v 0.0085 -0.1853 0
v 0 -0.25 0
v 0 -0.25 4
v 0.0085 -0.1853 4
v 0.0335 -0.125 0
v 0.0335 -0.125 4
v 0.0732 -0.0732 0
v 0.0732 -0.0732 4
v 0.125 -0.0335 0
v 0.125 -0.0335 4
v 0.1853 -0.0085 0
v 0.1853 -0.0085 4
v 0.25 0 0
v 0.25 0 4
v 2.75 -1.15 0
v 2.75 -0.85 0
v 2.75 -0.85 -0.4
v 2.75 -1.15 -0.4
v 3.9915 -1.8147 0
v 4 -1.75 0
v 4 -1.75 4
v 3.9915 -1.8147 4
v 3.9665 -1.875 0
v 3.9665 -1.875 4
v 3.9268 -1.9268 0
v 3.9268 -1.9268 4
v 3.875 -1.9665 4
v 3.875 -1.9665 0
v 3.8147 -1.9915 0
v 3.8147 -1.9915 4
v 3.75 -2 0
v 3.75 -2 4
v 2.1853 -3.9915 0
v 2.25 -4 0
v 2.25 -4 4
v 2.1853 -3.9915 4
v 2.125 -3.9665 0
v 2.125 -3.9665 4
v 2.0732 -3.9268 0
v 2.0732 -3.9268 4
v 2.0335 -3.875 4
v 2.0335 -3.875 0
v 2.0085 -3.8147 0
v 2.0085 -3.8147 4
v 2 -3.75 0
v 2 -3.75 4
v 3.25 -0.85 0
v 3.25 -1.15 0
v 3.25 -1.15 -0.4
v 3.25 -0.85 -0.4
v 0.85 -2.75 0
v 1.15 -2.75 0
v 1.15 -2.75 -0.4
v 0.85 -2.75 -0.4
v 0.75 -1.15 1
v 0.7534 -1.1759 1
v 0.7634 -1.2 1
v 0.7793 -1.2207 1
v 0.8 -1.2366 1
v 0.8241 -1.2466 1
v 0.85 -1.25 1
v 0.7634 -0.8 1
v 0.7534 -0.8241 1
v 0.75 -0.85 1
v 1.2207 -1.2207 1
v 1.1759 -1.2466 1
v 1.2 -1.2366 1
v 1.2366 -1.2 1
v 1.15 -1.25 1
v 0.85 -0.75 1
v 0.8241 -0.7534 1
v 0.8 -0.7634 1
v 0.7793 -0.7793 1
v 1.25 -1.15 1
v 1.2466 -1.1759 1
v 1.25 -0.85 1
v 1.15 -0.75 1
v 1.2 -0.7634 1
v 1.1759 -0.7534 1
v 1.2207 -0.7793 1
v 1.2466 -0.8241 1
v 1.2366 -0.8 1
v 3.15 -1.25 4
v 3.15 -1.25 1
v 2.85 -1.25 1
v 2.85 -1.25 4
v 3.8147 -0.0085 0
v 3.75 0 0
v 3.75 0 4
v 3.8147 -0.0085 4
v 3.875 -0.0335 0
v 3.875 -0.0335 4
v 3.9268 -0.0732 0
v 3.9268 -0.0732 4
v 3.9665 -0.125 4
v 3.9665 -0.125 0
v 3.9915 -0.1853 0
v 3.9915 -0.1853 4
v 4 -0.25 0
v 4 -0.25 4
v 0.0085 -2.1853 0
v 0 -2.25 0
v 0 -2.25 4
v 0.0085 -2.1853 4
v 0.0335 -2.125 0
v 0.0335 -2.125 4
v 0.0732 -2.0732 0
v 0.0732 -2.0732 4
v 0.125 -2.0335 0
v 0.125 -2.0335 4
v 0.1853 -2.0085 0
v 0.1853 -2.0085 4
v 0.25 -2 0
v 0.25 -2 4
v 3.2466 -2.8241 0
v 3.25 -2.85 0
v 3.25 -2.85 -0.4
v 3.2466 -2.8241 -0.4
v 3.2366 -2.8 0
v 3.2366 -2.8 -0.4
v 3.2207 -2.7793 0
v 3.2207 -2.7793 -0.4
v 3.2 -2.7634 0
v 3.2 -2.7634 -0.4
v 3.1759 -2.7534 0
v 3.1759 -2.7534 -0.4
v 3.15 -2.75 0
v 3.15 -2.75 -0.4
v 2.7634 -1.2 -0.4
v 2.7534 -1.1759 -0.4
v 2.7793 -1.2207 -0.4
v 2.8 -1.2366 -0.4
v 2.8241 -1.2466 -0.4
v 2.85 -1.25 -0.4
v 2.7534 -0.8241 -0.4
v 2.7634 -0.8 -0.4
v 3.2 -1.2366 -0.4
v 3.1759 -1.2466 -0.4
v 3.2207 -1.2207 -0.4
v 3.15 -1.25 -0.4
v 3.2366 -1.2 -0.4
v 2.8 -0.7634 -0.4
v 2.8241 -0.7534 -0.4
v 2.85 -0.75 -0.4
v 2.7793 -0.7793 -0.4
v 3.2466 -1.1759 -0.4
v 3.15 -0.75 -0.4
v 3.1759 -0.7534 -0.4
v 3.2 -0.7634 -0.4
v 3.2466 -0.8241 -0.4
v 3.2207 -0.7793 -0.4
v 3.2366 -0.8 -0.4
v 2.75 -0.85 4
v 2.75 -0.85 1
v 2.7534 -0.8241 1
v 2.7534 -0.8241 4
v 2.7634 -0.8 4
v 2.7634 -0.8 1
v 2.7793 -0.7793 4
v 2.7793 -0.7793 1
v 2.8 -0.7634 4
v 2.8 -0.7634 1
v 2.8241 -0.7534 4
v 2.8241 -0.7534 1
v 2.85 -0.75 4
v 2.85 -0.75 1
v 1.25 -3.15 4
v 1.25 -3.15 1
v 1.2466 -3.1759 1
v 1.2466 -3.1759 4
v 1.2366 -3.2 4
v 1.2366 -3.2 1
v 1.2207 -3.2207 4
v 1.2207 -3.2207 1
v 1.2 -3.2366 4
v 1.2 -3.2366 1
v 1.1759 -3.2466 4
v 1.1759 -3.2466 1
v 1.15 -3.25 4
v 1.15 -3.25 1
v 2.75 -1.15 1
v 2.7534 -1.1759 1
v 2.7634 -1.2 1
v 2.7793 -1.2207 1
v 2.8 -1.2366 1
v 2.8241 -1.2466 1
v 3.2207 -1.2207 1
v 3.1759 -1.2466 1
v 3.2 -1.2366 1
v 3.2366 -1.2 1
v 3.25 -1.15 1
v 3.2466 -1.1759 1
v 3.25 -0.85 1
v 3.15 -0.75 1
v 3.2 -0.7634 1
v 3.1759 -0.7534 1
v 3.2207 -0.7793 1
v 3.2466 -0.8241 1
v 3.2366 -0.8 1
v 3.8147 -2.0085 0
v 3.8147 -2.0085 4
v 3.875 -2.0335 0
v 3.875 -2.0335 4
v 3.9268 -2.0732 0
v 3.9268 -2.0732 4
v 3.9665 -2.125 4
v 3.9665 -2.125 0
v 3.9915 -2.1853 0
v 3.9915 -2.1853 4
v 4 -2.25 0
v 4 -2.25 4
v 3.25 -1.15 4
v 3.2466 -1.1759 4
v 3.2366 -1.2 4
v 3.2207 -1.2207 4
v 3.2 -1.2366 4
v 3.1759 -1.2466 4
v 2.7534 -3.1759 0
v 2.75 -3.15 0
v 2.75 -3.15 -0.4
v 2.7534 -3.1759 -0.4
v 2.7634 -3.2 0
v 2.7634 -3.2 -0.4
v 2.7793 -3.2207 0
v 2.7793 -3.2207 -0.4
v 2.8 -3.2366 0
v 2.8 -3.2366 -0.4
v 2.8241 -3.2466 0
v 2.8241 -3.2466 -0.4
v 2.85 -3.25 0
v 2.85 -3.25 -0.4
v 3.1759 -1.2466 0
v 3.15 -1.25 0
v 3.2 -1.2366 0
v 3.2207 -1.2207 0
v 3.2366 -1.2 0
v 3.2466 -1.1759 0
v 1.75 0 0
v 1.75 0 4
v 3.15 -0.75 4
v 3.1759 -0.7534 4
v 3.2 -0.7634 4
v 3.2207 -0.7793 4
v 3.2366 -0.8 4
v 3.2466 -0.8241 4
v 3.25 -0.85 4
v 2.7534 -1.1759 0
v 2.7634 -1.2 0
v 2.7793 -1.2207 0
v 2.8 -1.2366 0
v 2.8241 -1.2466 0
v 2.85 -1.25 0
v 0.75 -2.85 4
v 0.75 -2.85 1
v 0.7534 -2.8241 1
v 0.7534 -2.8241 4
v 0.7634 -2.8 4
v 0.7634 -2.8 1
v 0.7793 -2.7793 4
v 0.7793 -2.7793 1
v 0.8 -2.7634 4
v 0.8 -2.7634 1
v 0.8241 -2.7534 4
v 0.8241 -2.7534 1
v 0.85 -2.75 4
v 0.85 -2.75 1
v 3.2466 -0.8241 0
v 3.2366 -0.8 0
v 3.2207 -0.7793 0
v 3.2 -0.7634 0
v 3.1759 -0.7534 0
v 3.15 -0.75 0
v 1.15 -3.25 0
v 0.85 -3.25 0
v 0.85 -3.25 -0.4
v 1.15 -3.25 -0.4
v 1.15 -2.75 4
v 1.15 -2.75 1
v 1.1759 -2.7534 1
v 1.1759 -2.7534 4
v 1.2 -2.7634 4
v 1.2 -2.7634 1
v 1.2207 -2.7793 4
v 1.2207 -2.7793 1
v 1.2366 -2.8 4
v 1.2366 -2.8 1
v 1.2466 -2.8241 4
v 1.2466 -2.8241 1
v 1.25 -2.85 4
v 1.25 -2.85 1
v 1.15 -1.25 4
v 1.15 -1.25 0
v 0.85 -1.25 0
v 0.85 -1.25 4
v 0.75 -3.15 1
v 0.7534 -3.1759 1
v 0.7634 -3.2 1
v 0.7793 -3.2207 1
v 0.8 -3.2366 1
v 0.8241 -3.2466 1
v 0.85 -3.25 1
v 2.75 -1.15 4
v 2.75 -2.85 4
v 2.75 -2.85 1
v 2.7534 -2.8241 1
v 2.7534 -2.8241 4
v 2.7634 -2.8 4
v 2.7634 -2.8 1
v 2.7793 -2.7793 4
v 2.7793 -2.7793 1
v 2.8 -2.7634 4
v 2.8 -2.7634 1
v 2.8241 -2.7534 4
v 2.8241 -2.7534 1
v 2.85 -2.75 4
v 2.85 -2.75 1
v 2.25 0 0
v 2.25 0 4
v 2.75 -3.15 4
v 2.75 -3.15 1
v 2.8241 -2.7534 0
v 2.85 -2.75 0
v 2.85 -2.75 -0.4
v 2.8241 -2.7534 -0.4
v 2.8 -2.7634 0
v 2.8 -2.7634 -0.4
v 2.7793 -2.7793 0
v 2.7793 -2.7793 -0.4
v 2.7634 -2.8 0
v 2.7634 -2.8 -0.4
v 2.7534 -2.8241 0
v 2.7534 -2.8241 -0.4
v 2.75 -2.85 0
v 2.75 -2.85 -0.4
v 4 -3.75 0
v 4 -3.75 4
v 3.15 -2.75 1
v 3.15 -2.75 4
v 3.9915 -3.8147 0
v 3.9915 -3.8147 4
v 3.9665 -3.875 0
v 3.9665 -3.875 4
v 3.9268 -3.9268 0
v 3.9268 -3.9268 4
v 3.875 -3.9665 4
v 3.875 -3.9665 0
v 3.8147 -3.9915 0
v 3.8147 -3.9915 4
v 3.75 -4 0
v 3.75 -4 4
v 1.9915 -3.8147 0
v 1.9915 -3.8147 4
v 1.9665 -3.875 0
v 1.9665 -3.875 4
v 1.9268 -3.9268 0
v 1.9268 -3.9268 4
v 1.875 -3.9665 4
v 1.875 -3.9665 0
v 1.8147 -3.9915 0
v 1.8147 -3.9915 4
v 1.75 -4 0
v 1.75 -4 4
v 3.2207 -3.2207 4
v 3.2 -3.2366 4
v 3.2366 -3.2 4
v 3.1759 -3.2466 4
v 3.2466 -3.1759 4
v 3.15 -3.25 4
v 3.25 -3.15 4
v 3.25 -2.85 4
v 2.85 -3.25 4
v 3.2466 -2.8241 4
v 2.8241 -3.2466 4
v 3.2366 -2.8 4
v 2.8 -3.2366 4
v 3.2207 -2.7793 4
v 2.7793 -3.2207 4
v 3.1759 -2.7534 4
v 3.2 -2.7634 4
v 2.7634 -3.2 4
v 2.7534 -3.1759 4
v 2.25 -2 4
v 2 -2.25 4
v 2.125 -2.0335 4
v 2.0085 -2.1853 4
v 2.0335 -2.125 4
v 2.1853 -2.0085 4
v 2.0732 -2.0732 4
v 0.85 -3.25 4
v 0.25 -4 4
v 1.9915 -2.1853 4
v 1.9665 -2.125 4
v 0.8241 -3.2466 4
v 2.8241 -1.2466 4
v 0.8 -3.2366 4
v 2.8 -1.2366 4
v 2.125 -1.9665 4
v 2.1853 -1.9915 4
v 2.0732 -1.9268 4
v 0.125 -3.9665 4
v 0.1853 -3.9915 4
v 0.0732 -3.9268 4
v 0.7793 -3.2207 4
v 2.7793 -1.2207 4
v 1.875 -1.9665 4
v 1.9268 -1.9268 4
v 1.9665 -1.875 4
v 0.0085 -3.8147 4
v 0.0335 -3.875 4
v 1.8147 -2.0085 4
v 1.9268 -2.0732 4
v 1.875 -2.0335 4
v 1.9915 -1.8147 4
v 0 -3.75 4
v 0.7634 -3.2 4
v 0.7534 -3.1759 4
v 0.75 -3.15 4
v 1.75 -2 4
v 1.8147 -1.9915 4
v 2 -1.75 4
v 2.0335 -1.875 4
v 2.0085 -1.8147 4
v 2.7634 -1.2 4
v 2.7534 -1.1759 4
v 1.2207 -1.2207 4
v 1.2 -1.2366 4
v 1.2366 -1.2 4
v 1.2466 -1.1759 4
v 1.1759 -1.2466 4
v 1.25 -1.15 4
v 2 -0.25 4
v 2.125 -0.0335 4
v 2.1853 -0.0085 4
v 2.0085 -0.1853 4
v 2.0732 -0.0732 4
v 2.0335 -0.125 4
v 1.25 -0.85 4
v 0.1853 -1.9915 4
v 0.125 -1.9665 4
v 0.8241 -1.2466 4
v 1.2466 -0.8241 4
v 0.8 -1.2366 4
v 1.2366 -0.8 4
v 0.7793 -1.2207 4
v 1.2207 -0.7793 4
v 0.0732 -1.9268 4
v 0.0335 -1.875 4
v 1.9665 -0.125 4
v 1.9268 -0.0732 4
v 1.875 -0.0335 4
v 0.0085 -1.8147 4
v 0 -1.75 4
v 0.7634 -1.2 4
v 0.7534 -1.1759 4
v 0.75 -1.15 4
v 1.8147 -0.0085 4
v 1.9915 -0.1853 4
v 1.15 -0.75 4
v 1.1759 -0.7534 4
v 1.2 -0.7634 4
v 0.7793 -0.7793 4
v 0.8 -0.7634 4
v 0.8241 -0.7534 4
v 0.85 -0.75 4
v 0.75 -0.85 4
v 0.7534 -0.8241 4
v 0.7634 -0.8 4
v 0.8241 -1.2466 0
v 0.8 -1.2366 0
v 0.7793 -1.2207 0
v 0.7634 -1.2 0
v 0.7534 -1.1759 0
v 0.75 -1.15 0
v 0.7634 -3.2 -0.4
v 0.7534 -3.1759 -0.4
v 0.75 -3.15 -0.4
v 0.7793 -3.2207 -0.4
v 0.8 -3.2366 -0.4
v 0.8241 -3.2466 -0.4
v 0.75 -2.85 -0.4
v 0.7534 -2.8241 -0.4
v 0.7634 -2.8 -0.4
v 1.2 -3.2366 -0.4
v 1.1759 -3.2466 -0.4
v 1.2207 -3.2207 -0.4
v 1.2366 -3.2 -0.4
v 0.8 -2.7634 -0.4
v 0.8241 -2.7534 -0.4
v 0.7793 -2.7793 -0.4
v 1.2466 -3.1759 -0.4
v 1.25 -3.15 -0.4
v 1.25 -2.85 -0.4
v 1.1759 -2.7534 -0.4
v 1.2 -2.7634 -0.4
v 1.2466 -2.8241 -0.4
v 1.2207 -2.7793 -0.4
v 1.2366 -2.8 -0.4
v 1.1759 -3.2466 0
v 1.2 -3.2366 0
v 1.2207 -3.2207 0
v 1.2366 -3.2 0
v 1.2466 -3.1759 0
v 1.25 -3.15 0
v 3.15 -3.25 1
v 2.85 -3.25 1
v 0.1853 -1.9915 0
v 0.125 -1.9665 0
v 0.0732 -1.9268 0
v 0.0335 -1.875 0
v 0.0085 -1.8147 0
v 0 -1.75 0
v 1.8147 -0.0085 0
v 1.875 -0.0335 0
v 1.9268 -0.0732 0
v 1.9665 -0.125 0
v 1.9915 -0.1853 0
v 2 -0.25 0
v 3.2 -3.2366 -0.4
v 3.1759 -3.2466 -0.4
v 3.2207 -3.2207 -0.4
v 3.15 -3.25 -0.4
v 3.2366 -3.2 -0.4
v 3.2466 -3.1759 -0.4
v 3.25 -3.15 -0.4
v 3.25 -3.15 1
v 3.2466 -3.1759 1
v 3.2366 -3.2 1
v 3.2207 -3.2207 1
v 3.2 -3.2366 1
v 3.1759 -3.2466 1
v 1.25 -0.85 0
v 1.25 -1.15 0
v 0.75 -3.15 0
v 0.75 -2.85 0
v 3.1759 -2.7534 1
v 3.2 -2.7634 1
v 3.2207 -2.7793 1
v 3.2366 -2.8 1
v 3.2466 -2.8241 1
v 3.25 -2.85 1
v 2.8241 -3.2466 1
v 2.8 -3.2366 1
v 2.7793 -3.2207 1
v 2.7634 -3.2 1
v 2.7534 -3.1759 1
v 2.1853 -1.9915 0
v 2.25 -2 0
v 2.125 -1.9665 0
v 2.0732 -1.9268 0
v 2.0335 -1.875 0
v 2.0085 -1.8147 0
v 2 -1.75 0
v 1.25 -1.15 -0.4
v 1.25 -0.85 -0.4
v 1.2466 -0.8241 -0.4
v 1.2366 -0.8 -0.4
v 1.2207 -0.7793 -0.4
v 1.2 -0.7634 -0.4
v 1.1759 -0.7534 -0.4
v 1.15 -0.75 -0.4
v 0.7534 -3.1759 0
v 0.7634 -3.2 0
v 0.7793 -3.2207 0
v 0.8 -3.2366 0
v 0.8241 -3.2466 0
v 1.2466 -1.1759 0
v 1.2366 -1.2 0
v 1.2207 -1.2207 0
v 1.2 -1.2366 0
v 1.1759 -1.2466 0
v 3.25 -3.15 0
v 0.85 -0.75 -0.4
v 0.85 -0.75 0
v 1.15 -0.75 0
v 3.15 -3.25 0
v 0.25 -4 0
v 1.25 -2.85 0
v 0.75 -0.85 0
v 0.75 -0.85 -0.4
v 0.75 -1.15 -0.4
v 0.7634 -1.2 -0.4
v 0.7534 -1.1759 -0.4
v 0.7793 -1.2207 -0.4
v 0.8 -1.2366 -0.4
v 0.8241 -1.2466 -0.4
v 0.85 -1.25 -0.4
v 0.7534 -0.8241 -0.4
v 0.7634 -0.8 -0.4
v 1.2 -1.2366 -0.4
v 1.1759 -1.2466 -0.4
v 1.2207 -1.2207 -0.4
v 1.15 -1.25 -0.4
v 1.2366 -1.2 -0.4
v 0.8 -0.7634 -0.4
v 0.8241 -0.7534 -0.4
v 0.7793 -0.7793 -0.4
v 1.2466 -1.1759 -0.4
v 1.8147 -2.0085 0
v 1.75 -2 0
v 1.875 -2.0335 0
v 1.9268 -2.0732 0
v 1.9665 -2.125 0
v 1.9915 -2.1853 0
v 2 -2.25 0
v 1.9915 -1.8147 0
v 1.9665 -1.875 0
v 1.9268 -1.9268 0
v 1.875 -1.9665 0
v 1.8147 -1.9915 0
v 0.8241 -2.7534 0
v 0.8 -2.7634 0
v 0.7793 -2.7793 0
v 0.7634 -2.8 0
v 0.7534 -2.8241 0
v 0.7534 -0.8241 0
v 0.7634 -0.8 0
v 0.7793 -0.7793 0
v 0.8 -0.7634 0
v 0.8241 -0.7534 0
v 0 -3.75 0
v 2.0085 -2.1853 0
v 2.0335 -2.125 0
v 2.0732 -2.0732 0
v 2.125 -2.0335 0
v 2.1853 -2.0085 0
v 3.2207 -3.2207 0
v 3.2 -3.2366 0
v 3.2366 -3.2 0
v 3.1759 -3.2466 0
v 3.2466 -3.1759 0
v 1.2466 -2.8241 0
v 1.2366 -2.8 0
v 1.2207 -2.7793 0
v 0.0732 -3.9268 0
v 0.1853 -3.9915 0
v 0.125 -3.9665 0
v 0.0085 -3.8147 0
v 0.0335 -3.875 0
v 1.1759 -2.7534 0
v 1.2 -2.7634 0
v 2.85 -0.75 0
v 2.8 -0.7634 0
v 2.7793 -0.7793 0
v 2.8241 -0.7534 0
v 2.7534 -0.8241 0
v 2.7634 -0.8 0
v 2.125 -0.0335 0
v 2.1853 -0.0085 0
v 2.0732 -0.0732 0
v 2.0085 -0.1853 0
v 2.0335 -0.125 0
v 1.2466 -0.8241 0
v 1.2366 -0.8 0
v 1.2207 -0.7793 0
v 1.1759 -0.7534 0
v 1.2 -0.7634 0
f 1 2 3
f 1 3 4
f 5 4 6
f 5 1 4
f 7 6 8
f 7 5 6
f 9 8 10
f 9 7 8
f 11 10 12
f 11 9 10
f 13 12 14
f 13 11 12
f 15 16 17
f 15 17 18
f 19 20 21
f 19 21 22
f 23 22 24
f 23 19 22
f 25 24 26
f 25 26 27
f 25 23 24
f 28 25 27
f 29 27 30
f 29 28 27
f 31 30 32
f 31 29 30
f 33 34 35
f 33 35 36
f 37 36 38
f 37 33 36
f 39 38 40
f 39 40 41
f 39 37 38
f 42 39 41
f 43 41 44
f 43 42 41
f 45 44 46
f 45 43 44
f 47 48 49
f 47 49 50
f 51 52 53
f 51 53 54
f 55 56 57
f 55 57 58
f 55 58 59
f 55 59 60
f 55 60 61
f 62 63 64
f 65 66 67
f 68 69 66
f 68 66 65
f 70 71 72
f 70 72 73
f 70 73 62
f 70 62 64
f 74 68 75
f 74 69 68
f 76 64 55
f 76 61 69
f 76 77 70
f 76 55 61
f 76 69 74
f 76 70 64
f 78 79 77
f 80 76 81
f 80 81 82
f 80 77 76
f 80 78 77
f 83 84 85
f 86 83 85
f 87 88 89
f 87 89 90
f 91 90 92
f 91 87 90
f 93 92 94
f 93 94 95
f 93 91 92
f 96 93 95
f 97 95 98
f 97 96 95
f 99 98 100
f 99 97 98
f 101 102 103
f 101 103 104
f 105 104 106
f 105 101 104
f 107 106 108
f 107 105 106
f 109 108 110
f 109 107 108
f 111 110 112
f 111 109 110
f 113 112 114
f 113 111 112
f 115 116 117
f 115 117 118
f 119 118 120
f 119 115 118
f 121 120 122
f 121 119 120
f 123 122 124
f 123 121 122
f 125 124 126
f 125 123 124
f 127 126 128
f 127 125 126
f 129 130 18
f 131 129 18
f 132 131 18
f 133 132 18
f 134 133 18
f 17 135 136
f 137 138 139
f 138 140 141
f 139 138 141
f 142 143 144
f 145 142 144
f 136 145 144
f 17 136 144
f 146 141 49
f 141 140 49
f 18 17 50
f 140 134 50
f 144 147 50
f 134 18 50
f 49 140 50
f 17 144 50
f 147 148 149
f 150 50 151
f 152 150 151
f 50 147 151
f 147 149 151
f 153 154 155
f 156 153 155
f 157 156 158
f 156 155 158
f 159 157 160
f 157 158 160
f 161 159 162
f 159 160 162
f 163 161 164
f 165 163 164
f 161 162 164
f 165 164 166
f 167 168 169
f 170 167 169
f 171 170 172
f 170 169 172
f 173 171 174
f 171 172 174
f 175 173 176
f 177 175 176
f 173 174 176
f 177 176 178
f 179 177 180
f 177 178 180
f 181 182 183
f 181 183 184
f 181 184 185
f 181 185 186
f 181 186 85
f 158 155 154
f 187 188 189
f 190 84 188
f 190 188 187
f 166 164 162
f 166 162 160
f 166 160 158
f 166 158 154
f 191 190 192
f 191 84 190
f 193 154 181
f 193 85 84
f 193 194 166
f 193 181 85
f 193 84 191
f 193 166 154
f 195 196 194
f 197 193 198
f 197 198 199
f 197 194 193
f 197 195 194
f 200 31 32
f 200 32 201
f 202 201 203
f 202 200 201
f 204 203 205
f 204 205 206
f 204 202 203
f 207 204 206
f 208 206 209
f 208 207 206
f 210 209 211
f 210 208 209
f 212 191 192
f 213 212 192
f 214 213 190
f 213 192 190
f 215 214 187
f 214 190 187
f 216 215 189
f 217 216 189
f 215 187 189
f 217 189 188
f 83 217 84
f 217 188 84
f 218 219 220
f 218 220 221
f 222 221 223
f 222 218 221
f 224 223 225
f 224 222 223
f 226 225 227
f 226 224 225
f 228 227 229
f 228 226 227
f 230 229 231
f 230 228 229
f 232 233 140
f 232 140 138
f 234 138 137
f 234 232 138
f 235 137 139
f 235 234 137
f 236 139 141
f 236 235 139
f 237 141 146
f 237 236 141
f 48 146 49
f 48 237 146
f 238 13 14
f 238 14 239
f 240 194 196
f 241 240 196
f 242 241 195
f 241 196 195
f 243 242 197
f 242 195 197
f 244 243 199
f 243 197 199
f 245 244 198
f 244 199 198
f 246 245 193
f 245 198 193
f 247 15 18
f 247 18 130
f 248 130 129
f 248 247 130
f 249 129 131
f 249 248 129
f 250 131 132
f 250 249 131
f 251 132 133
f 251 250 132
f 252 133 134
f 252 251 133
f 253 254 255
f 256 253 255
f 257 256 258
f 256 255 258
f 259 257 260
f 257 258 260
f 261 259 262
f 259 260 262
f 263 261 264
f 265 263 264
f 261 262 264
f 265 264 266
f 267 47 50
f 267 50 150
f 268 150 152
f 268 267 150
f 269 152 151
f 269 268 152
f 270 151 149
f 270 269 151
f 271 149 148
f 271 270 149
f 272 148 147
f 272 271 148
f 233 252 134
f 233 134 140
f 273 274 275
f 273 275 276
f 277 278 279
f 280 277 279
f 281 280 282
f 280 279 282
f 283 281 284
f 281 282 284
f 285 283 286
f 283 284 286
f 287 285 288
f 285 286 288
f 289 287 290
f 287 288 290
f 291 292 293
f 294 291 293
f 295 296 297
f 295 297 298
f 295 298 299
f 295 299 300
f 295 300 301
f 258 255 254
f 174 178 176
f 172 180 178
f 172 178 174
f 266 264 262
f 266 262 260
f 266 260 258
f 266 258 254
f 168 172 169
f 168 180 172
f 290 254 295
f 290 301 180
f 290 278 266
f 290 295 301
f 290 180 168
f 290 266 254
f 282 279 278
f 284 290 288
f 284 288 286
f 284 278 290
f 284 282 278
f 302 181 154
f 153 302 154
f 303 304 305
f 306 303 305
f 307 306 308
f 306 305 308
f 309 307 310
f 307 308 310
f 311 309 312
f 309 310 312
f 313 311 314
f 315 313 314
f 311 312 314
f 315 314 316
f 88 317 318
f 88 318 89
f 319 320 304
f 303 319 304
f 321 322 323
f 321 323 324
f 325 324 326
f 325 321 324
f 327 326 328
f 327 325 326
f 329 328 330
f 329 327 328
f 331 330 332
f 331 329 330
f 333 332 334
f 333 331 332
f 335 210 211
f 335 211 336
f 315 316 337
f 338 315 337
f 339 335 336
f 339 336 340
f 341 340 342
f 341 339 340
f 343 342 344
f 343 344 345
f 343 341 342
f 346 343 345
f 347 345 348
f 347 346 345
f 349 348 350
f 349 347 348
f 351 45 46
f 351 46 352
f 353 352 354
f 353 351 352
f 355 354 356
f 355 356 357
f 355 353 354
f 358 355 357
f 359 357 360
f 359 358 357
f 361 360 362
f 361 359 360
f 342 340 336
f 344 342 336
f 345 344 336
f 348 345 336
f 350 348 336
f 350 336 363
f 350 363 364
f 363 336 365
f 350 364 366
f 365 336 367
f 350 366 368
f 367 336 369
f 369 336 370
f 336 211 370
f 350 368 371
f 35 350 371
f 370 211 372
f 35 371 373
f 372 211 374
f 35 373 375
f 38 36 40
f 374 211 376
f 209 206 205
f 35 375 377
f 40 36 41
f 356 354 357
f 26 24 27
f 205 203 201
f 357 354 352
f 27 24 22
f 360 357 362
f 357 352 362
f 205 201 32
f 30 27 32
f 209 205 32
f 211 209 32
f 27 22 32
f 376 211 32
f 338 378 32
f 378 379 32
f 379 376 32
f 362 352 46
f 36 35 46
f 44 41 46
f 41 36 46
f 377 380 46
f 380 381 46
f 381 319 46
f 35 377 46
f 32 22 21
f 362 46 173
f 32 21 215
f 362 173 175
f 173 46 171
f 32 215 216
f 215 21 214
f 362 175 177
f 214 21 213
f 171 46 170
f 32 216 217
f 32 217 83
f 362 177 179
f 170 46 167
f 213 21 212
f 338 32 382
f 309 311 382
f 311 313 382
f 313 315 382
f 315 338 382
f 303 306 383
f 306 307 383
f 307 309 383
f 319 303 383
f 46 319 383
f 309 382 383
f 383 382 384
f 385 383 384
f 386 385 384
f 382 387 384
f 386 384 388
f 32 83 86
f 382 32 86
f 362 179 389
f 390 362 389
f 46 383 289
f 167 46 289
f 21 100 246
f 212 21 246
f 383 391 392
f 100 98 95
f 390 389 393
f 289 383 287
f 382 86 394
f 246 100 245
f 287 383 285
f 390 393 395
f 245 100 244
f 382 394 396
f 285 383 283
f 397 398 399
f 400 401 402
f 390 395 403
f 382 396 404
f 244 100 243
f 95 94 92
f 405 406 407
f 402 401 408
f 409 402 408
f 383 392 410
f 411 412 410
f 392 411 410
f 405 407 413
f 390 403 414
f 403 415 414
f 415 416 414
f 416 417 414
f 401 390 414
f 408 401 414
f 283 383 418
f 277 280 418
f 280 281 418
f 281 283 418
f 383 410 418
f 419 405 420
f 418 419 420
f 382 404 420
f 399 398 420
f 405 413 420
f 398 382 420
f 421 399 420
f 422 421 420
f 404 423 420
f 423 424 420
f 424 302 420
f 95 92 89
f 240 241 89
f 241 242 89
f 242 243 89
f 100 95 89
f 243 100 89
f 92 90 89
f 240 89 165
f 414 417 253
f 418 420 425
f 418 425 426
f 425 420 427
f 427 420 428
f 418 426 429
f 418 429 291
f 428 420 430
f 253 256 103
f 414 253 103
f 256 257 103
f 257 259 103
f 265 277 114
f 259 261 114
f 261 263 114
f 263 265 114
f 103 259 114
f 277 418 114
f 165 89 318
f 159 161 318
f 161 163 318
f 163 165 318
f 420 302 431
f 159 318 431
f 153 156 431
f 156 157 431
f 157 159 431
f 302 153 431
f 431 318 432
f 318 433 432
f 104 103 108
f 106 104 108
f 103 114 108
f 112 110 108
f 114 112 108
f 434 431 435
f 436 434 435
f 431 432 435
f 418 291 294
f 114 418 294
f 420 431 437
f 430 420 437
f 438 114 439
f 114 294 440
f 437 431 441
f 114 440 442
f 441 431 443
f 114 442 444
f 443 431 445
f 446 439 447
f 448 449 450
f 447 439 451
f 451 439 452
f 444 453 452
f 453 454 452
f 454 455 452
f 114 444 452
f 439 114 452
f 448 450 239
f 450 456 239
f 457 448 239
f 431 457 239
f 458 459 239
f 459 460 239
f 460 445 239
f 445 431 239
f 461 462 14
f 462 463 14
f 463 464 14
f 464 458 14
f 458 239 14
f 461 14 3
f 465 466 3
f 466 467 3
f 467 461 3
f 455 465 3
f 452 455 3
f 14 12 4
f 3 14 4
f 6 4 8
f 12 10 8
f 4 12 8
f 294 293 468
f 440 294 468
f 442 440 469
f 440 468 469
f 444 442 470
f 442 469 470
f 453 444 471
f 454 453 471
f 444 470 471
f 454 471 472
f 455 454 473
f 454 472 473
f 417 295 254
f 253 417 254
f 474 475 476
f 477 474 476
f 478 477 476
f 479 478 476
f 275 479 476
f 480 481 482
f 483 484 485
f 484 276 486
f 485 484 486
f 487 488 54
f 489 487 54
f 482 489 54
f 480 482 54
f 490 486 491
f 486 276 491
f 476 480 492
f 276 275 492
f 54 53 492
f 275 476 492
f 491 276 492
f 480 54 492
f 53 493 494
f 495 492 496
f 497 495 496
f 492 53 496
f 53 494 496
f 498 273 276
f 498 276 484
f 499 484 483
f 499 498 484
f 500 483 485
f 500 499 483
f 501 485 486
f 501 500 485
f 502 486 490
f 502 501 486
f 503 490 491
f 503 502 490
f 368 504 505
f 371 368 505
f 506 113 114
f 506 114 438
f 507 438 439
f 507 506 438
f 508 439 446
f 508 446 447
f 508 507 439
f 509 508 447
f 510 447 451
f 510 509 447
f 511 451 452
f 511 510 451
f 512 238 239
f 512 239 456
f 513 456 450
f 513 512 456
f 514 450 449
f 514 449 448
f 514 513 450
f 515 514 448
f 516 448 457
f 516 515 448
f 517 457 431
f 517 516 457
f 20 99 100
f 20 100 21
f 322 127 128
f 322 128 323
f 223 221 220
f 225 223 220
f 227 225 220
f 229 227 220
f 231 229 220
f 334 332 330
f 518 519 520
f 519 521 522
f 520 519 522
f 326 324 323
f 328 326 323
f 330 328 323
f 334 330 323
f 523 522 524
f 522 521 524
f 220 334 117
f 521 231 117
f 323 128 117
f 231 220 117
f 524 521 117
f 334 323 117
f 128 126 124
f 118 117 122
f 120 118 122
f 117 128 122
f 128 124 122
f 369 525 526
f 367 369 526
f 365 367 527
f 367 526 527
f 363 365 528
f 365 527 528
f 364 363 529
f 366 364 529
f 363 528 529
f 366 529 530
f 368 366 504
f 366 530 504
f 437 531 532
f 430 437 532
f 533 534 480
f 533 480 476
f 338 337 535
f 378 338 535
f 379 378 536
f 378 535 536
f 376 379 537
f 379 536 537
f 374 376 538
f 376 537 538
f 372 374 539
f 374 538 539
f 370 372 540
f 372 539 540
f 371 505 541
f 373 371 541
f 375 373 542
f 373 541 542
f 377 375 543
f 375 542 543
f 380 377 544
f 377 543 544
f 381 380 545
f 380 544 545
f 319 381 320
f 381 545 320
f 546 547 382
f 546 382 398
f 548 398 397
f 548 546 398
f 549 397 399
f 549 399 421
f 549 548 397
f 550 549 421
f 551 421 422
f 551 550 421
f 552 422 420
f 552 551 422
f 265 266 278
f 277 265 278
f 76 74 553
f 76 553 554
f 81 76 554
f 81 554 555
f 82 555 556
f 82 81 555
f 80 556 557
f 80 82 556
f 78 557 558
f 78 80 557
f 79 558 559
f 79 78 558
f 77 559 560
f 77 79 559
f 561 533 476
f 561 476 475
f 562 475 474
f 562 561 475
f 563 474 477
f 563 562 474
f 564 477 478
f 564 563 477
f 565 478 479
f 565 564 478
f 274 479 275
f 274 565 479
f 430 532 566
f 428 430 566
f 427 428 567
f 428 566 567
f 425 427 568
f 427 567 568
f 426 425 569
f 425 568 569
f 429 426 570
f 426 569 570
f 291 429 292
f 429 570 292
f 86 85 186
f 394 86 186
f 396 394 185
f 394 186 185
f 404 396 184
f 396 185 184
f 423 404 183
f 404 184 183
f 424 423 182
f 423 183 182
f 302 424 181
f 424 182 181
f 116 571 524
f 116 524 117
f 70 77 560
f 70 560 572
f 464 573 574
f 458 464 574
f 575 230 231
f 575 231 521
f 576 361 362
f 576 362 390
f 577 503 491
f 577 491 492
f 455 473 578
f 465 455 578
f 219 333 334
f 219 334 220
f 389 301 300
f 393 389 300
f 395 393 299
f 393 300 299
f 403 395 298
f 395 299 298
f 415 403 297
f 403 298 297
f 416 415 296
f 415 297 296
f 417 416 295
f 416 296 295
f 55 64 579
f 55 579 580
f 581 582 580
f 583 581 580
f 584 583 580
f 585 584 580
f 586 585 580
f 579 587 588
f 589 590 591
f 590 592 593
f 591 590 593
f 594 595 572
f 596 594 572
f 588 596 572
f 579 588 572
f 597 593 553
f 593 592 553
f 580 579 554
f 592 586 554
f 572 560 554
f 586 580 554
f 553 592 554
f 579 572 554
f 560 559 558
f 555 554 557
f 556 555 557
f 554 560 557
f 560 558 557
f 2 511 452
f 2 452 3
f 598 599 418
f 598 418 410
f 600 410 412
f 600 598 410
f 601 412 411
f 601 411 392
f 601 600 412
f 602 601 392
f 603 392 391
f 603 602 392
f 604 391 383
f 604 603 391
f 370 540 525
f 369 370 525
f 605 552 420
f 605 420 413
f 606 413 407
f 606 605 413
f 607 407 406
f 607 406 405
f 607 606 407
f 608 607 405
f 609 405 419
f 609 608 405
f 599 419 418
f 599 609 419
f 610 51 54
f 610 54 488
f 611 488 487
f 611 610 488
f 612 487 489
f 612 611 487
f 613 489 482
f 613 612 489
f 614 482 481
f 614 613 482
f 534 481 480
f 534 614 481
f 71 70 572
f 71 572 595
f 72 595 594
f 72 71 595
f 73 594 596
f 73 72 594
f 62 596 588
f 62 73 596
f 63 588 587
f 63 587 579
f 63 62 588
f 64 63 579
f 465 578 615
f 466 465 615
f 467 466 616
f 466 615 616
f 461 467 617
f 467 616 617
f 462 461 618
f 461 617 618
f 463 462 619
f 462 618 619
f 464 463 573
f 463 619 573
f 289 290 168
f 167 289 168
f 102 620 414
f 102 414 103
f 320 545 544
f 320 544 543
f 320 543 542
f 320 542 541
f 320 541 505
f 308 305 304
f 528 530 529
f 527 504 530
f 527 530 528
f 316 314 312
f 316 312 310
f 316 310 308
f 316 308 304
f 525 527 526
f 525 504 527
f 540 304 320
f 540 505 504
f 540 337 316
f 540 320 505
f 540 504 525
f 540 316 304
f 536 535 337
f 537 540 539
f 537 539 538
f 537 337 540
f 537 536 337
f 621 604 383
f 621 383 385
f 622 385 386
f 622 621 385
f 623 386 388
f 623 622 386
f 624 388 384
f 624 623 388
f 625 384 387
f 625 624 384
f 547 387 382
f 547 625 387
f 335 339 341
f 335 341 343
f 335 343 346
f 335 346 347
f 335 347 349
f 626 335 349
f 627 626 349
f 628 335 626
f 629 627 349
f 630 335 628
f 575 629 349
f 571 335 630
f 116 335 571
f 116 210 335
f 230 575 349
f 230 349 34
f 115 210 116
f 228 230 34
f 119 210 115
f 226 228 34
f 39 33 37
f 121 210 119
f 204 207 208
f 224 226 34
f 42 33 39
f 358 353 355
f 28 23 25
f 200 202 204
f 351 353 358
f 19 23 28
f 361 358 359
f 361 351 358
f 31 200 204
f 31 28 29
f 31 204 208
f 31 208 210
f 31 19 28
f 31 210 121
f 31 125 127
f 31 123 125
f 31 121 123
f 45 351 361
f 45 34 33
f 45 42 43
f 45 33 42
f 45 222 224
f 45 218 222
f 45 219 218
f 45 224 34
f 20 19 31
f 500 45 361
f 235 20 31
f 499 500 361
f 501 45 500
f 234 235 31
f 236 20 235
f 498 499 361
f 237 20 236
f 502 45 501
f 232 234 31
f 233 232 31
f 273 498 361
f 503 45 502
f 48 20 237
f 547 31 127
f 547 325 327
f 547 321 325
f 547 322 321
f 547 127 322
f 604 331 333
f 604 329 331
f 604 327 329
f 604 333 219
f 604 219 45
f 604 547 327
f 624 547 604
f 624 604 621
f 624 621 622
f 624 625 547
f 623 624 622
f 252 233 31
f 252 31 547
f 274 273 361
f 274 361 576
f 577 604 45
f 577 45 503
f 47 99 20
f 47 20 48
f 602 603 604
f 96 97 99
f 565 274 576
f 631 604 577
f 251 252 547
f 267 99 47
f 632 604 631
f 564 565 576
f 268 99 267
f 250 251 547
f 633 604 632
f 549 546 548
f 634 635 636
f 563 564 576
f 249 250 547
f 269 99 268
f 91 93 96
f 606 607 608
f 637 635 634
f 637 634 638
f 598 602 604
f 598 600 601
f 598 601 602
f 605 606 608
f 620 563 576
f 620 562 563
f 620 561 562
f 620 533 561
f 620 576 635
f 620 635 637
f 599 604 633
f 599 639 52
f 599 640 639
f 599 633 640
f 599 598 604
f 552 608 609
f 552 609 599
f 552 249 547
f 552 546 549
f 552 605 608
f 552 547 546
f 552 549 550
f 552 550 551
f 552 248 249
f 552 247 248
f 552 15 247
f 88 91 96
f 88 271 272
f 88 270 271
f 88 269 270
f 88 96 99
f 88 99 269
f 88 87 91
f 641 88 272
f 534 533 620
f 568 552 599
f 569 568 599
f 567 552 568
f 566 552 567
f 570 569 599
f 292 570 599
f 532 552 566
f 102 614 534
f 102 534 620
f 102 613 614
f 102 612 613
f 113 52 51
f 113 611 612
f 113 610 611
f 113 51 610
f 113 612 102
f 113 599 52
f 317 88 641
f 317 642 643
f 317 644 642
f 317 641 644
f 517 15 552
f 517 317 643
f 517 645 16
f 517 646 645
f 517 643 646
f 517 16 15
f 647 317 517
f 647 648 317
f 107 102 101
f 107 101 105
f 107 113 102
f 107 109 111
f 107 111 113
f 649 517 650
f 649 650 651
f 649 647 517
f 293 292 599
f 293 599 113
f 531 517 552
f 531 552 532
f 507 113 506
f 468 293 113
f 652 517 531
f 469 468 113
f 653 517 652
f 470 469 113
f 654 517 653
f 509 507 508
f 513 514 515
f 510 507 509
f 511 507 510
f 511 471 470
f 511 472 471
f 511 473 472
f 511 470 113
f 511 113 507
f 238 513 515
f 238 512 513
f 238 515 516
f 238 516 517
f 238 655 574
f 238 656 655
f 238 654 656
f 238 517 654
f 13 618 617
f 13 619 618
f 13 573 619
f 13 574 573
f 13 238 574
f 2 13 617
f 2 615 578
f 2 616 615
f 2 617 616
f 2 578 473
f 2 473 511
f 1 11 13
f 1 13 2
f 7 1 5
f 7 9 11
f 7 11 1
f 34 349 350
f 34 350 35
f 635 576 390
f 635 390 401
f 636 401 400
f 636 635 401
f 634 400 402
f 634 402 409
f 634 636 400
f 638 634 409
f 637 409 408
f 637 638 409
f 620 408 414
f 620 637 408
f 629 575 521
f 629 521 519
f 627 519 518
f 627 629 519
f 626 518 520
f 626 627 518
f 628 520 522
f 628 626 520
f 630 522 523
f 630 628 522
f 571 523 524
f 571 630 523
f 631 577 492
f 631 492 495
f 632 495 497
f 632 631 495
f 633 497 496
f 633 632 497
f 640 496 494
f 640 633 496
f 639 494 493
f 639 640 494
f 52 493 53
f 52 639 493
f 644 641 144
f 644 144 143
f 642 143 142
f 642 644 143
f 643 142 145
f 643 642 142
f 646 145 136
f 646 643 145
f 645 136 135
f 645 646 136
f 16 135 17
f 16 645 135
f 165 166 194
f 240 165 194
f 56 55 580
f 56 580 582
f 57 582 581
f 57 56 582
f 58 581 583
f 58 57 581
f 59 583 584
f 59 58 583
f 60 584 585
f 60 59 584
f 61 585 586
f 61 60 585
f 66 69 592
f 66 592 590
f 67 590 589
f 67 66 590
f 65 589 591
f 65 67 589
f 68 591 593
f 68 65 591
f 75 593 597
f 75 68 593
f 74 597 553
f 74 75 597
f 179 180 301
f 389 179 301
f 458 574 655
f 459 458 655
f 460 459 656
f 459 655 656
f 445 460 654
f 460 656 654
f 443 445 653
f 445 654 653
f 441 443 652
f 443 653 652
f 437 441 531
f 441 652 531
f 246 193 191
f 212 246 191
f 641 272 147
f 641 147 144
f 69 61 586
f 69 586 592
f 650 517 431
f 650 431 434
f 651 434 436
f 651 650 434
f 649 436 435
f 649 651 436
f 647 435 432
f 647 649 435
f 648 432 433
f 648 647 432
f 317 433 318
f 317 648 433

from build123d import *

# Parameters (mm, degrees)
EXTRUDE_1_DEPTH              = 4
PATTERN_LINEAR_2_COUNT       = 2
PATTERN_LINEAR_2_PITCH       = 2
PATTERN_LINEAR_2_COUNT_DIR2  = 2
PATTERN_LINEAR_2_PITCH_DIR2  = 2
EXTRUDE_START                = -1
EXTRUDE_3_DEPTH              = 1.4
PATTERN_LINEAR_11_COUNT      = 2
PATTERN_LINEAR_11_PITCH      = 2
PATTERN_LINEAR_11_COUNT_DIR2 = 2
PATTERN_LINEAR_11_PITCH_DIR2 = 2


with BuildPart() as part:
    # 草图1 → 凸台-拉伸1 (new body)
    with BuildSketch(Plane.XY):
        with BuildLine():
            Line((0.25, 0), (1.75, 0))
            ThreePointArc((1.75, 0), (1.926776695, -0.073223305), (2, -0.25))
            Line((2, -0.25), (2, -1.75))
            ThreePointArc((2, -1.75), (1.926776695, -1.926776695), (1.75, -2))
            Line((1.75, -2), (0.25, -2))
            ThreePointArc((0.25, -2), (0.073223305, -1.926776695), (0, -1.75))
            Line((0, -1.75), (0, -0.25))
            ThreePointArc((0, -0.25), (0.073223305, -0.073223305), (0.25, 0))
        make_face()
        with BuildLine():
            Line((0.85, -0.75), (1.15, -0.75))
            ThreePointArc((1.15, -0.75), (1.220710678, -0.779289322), (1.25, -0.85))
            Line((1.25, -0.85), (1.25, -1.15))
            ThreePointArc((1.25, -1.15), (1.220710678, -1.220710678), (1.15, -1.25))
            Line((1.15, -1.25), (0.85, -1.25))
            ThreePointArc((0.85, -1.25), (0.779289322, -1.220710678), (0.75, -1.15))
            Line((0.75, -1.15), (0.75, -0.85))
            ThreePointArc((0.75, -0.85), (0.779289322, -0.779289322), (0.85, -0.75))
        make_face(mode=Mode.SUBTRACT)
    extrude_1 = extrude(amount=EXTRUDE_1_DEPTH)

    # 阵列(线性)2: Extrude 1 2 × 2
    with Locations(*[(i * PATTERN_LINEAR_2_PITCH, -j * PATTERN_LINEAR_2_PITCH_DIR2, 0) for i in range(PATTERN_LINEAR_2_COUNT) for j in range(PATTERN_LINEAR_2_COUNT_DIR2) if (i, j) != (0, 0)]):
        add(extrude_1)


with BuildPart() as body_2:
    # 草图5 → 凸台-拉伸3 (new body)
    with BuildSketch(Plane(origin=(0, 0, 0), x_dir=(-1, 0, 0), z_dir=(0, 0, -1)).offset(EXTRUDE_START)):
        with BuildLine():
            Line((-0.75, -0.85), (-0.75, -1.15))
            ThreePointArc((-0.75, -1.15), (-0.779289322, -1.220710678), (-0.85, -1.25))
            Line((-0.85, -1.25), (-1.15, -1.25))
            ThreePointArc((-1.15, -1.25), (-1.220710678, -1.220710678), (-1.25, -1.15))
            Line((-1.25, -1.15), (-1.25, -0.85))
            ThreePointArc((-1.25, -0.85), (-1.220710678, -0.779289322), (-1.15, -0.75))
            Line((-1.15, -0.75), (-0.85, -0.75))
            ThreePointArc((-0.85, -0.75), (-0.779289322, -0.779289322), (-0.75, -0.85))
        make_face()
    extrude_3 = extrude(amount=EXTRUDE_3_DEPTH)


with BuildPart() as part_1:
    add(part.part)

    # 阵列(线性)11: Extrude 3 2 × 2
    with Locations(*[(i * PATTERN_LINEAR_11_PITCH, -j * PATTERN_LINEAR_11_PITCH_DIR2, 0) for i in range(PATTERN_LINEAR_11_COUNT) for j in range(PATTERN_LINEAR_11_COUNT_DIR2) if (i, j) != (0, 0)]):
        add(extrude_3)


solid = Compound([body_2.part, part_1.part])
